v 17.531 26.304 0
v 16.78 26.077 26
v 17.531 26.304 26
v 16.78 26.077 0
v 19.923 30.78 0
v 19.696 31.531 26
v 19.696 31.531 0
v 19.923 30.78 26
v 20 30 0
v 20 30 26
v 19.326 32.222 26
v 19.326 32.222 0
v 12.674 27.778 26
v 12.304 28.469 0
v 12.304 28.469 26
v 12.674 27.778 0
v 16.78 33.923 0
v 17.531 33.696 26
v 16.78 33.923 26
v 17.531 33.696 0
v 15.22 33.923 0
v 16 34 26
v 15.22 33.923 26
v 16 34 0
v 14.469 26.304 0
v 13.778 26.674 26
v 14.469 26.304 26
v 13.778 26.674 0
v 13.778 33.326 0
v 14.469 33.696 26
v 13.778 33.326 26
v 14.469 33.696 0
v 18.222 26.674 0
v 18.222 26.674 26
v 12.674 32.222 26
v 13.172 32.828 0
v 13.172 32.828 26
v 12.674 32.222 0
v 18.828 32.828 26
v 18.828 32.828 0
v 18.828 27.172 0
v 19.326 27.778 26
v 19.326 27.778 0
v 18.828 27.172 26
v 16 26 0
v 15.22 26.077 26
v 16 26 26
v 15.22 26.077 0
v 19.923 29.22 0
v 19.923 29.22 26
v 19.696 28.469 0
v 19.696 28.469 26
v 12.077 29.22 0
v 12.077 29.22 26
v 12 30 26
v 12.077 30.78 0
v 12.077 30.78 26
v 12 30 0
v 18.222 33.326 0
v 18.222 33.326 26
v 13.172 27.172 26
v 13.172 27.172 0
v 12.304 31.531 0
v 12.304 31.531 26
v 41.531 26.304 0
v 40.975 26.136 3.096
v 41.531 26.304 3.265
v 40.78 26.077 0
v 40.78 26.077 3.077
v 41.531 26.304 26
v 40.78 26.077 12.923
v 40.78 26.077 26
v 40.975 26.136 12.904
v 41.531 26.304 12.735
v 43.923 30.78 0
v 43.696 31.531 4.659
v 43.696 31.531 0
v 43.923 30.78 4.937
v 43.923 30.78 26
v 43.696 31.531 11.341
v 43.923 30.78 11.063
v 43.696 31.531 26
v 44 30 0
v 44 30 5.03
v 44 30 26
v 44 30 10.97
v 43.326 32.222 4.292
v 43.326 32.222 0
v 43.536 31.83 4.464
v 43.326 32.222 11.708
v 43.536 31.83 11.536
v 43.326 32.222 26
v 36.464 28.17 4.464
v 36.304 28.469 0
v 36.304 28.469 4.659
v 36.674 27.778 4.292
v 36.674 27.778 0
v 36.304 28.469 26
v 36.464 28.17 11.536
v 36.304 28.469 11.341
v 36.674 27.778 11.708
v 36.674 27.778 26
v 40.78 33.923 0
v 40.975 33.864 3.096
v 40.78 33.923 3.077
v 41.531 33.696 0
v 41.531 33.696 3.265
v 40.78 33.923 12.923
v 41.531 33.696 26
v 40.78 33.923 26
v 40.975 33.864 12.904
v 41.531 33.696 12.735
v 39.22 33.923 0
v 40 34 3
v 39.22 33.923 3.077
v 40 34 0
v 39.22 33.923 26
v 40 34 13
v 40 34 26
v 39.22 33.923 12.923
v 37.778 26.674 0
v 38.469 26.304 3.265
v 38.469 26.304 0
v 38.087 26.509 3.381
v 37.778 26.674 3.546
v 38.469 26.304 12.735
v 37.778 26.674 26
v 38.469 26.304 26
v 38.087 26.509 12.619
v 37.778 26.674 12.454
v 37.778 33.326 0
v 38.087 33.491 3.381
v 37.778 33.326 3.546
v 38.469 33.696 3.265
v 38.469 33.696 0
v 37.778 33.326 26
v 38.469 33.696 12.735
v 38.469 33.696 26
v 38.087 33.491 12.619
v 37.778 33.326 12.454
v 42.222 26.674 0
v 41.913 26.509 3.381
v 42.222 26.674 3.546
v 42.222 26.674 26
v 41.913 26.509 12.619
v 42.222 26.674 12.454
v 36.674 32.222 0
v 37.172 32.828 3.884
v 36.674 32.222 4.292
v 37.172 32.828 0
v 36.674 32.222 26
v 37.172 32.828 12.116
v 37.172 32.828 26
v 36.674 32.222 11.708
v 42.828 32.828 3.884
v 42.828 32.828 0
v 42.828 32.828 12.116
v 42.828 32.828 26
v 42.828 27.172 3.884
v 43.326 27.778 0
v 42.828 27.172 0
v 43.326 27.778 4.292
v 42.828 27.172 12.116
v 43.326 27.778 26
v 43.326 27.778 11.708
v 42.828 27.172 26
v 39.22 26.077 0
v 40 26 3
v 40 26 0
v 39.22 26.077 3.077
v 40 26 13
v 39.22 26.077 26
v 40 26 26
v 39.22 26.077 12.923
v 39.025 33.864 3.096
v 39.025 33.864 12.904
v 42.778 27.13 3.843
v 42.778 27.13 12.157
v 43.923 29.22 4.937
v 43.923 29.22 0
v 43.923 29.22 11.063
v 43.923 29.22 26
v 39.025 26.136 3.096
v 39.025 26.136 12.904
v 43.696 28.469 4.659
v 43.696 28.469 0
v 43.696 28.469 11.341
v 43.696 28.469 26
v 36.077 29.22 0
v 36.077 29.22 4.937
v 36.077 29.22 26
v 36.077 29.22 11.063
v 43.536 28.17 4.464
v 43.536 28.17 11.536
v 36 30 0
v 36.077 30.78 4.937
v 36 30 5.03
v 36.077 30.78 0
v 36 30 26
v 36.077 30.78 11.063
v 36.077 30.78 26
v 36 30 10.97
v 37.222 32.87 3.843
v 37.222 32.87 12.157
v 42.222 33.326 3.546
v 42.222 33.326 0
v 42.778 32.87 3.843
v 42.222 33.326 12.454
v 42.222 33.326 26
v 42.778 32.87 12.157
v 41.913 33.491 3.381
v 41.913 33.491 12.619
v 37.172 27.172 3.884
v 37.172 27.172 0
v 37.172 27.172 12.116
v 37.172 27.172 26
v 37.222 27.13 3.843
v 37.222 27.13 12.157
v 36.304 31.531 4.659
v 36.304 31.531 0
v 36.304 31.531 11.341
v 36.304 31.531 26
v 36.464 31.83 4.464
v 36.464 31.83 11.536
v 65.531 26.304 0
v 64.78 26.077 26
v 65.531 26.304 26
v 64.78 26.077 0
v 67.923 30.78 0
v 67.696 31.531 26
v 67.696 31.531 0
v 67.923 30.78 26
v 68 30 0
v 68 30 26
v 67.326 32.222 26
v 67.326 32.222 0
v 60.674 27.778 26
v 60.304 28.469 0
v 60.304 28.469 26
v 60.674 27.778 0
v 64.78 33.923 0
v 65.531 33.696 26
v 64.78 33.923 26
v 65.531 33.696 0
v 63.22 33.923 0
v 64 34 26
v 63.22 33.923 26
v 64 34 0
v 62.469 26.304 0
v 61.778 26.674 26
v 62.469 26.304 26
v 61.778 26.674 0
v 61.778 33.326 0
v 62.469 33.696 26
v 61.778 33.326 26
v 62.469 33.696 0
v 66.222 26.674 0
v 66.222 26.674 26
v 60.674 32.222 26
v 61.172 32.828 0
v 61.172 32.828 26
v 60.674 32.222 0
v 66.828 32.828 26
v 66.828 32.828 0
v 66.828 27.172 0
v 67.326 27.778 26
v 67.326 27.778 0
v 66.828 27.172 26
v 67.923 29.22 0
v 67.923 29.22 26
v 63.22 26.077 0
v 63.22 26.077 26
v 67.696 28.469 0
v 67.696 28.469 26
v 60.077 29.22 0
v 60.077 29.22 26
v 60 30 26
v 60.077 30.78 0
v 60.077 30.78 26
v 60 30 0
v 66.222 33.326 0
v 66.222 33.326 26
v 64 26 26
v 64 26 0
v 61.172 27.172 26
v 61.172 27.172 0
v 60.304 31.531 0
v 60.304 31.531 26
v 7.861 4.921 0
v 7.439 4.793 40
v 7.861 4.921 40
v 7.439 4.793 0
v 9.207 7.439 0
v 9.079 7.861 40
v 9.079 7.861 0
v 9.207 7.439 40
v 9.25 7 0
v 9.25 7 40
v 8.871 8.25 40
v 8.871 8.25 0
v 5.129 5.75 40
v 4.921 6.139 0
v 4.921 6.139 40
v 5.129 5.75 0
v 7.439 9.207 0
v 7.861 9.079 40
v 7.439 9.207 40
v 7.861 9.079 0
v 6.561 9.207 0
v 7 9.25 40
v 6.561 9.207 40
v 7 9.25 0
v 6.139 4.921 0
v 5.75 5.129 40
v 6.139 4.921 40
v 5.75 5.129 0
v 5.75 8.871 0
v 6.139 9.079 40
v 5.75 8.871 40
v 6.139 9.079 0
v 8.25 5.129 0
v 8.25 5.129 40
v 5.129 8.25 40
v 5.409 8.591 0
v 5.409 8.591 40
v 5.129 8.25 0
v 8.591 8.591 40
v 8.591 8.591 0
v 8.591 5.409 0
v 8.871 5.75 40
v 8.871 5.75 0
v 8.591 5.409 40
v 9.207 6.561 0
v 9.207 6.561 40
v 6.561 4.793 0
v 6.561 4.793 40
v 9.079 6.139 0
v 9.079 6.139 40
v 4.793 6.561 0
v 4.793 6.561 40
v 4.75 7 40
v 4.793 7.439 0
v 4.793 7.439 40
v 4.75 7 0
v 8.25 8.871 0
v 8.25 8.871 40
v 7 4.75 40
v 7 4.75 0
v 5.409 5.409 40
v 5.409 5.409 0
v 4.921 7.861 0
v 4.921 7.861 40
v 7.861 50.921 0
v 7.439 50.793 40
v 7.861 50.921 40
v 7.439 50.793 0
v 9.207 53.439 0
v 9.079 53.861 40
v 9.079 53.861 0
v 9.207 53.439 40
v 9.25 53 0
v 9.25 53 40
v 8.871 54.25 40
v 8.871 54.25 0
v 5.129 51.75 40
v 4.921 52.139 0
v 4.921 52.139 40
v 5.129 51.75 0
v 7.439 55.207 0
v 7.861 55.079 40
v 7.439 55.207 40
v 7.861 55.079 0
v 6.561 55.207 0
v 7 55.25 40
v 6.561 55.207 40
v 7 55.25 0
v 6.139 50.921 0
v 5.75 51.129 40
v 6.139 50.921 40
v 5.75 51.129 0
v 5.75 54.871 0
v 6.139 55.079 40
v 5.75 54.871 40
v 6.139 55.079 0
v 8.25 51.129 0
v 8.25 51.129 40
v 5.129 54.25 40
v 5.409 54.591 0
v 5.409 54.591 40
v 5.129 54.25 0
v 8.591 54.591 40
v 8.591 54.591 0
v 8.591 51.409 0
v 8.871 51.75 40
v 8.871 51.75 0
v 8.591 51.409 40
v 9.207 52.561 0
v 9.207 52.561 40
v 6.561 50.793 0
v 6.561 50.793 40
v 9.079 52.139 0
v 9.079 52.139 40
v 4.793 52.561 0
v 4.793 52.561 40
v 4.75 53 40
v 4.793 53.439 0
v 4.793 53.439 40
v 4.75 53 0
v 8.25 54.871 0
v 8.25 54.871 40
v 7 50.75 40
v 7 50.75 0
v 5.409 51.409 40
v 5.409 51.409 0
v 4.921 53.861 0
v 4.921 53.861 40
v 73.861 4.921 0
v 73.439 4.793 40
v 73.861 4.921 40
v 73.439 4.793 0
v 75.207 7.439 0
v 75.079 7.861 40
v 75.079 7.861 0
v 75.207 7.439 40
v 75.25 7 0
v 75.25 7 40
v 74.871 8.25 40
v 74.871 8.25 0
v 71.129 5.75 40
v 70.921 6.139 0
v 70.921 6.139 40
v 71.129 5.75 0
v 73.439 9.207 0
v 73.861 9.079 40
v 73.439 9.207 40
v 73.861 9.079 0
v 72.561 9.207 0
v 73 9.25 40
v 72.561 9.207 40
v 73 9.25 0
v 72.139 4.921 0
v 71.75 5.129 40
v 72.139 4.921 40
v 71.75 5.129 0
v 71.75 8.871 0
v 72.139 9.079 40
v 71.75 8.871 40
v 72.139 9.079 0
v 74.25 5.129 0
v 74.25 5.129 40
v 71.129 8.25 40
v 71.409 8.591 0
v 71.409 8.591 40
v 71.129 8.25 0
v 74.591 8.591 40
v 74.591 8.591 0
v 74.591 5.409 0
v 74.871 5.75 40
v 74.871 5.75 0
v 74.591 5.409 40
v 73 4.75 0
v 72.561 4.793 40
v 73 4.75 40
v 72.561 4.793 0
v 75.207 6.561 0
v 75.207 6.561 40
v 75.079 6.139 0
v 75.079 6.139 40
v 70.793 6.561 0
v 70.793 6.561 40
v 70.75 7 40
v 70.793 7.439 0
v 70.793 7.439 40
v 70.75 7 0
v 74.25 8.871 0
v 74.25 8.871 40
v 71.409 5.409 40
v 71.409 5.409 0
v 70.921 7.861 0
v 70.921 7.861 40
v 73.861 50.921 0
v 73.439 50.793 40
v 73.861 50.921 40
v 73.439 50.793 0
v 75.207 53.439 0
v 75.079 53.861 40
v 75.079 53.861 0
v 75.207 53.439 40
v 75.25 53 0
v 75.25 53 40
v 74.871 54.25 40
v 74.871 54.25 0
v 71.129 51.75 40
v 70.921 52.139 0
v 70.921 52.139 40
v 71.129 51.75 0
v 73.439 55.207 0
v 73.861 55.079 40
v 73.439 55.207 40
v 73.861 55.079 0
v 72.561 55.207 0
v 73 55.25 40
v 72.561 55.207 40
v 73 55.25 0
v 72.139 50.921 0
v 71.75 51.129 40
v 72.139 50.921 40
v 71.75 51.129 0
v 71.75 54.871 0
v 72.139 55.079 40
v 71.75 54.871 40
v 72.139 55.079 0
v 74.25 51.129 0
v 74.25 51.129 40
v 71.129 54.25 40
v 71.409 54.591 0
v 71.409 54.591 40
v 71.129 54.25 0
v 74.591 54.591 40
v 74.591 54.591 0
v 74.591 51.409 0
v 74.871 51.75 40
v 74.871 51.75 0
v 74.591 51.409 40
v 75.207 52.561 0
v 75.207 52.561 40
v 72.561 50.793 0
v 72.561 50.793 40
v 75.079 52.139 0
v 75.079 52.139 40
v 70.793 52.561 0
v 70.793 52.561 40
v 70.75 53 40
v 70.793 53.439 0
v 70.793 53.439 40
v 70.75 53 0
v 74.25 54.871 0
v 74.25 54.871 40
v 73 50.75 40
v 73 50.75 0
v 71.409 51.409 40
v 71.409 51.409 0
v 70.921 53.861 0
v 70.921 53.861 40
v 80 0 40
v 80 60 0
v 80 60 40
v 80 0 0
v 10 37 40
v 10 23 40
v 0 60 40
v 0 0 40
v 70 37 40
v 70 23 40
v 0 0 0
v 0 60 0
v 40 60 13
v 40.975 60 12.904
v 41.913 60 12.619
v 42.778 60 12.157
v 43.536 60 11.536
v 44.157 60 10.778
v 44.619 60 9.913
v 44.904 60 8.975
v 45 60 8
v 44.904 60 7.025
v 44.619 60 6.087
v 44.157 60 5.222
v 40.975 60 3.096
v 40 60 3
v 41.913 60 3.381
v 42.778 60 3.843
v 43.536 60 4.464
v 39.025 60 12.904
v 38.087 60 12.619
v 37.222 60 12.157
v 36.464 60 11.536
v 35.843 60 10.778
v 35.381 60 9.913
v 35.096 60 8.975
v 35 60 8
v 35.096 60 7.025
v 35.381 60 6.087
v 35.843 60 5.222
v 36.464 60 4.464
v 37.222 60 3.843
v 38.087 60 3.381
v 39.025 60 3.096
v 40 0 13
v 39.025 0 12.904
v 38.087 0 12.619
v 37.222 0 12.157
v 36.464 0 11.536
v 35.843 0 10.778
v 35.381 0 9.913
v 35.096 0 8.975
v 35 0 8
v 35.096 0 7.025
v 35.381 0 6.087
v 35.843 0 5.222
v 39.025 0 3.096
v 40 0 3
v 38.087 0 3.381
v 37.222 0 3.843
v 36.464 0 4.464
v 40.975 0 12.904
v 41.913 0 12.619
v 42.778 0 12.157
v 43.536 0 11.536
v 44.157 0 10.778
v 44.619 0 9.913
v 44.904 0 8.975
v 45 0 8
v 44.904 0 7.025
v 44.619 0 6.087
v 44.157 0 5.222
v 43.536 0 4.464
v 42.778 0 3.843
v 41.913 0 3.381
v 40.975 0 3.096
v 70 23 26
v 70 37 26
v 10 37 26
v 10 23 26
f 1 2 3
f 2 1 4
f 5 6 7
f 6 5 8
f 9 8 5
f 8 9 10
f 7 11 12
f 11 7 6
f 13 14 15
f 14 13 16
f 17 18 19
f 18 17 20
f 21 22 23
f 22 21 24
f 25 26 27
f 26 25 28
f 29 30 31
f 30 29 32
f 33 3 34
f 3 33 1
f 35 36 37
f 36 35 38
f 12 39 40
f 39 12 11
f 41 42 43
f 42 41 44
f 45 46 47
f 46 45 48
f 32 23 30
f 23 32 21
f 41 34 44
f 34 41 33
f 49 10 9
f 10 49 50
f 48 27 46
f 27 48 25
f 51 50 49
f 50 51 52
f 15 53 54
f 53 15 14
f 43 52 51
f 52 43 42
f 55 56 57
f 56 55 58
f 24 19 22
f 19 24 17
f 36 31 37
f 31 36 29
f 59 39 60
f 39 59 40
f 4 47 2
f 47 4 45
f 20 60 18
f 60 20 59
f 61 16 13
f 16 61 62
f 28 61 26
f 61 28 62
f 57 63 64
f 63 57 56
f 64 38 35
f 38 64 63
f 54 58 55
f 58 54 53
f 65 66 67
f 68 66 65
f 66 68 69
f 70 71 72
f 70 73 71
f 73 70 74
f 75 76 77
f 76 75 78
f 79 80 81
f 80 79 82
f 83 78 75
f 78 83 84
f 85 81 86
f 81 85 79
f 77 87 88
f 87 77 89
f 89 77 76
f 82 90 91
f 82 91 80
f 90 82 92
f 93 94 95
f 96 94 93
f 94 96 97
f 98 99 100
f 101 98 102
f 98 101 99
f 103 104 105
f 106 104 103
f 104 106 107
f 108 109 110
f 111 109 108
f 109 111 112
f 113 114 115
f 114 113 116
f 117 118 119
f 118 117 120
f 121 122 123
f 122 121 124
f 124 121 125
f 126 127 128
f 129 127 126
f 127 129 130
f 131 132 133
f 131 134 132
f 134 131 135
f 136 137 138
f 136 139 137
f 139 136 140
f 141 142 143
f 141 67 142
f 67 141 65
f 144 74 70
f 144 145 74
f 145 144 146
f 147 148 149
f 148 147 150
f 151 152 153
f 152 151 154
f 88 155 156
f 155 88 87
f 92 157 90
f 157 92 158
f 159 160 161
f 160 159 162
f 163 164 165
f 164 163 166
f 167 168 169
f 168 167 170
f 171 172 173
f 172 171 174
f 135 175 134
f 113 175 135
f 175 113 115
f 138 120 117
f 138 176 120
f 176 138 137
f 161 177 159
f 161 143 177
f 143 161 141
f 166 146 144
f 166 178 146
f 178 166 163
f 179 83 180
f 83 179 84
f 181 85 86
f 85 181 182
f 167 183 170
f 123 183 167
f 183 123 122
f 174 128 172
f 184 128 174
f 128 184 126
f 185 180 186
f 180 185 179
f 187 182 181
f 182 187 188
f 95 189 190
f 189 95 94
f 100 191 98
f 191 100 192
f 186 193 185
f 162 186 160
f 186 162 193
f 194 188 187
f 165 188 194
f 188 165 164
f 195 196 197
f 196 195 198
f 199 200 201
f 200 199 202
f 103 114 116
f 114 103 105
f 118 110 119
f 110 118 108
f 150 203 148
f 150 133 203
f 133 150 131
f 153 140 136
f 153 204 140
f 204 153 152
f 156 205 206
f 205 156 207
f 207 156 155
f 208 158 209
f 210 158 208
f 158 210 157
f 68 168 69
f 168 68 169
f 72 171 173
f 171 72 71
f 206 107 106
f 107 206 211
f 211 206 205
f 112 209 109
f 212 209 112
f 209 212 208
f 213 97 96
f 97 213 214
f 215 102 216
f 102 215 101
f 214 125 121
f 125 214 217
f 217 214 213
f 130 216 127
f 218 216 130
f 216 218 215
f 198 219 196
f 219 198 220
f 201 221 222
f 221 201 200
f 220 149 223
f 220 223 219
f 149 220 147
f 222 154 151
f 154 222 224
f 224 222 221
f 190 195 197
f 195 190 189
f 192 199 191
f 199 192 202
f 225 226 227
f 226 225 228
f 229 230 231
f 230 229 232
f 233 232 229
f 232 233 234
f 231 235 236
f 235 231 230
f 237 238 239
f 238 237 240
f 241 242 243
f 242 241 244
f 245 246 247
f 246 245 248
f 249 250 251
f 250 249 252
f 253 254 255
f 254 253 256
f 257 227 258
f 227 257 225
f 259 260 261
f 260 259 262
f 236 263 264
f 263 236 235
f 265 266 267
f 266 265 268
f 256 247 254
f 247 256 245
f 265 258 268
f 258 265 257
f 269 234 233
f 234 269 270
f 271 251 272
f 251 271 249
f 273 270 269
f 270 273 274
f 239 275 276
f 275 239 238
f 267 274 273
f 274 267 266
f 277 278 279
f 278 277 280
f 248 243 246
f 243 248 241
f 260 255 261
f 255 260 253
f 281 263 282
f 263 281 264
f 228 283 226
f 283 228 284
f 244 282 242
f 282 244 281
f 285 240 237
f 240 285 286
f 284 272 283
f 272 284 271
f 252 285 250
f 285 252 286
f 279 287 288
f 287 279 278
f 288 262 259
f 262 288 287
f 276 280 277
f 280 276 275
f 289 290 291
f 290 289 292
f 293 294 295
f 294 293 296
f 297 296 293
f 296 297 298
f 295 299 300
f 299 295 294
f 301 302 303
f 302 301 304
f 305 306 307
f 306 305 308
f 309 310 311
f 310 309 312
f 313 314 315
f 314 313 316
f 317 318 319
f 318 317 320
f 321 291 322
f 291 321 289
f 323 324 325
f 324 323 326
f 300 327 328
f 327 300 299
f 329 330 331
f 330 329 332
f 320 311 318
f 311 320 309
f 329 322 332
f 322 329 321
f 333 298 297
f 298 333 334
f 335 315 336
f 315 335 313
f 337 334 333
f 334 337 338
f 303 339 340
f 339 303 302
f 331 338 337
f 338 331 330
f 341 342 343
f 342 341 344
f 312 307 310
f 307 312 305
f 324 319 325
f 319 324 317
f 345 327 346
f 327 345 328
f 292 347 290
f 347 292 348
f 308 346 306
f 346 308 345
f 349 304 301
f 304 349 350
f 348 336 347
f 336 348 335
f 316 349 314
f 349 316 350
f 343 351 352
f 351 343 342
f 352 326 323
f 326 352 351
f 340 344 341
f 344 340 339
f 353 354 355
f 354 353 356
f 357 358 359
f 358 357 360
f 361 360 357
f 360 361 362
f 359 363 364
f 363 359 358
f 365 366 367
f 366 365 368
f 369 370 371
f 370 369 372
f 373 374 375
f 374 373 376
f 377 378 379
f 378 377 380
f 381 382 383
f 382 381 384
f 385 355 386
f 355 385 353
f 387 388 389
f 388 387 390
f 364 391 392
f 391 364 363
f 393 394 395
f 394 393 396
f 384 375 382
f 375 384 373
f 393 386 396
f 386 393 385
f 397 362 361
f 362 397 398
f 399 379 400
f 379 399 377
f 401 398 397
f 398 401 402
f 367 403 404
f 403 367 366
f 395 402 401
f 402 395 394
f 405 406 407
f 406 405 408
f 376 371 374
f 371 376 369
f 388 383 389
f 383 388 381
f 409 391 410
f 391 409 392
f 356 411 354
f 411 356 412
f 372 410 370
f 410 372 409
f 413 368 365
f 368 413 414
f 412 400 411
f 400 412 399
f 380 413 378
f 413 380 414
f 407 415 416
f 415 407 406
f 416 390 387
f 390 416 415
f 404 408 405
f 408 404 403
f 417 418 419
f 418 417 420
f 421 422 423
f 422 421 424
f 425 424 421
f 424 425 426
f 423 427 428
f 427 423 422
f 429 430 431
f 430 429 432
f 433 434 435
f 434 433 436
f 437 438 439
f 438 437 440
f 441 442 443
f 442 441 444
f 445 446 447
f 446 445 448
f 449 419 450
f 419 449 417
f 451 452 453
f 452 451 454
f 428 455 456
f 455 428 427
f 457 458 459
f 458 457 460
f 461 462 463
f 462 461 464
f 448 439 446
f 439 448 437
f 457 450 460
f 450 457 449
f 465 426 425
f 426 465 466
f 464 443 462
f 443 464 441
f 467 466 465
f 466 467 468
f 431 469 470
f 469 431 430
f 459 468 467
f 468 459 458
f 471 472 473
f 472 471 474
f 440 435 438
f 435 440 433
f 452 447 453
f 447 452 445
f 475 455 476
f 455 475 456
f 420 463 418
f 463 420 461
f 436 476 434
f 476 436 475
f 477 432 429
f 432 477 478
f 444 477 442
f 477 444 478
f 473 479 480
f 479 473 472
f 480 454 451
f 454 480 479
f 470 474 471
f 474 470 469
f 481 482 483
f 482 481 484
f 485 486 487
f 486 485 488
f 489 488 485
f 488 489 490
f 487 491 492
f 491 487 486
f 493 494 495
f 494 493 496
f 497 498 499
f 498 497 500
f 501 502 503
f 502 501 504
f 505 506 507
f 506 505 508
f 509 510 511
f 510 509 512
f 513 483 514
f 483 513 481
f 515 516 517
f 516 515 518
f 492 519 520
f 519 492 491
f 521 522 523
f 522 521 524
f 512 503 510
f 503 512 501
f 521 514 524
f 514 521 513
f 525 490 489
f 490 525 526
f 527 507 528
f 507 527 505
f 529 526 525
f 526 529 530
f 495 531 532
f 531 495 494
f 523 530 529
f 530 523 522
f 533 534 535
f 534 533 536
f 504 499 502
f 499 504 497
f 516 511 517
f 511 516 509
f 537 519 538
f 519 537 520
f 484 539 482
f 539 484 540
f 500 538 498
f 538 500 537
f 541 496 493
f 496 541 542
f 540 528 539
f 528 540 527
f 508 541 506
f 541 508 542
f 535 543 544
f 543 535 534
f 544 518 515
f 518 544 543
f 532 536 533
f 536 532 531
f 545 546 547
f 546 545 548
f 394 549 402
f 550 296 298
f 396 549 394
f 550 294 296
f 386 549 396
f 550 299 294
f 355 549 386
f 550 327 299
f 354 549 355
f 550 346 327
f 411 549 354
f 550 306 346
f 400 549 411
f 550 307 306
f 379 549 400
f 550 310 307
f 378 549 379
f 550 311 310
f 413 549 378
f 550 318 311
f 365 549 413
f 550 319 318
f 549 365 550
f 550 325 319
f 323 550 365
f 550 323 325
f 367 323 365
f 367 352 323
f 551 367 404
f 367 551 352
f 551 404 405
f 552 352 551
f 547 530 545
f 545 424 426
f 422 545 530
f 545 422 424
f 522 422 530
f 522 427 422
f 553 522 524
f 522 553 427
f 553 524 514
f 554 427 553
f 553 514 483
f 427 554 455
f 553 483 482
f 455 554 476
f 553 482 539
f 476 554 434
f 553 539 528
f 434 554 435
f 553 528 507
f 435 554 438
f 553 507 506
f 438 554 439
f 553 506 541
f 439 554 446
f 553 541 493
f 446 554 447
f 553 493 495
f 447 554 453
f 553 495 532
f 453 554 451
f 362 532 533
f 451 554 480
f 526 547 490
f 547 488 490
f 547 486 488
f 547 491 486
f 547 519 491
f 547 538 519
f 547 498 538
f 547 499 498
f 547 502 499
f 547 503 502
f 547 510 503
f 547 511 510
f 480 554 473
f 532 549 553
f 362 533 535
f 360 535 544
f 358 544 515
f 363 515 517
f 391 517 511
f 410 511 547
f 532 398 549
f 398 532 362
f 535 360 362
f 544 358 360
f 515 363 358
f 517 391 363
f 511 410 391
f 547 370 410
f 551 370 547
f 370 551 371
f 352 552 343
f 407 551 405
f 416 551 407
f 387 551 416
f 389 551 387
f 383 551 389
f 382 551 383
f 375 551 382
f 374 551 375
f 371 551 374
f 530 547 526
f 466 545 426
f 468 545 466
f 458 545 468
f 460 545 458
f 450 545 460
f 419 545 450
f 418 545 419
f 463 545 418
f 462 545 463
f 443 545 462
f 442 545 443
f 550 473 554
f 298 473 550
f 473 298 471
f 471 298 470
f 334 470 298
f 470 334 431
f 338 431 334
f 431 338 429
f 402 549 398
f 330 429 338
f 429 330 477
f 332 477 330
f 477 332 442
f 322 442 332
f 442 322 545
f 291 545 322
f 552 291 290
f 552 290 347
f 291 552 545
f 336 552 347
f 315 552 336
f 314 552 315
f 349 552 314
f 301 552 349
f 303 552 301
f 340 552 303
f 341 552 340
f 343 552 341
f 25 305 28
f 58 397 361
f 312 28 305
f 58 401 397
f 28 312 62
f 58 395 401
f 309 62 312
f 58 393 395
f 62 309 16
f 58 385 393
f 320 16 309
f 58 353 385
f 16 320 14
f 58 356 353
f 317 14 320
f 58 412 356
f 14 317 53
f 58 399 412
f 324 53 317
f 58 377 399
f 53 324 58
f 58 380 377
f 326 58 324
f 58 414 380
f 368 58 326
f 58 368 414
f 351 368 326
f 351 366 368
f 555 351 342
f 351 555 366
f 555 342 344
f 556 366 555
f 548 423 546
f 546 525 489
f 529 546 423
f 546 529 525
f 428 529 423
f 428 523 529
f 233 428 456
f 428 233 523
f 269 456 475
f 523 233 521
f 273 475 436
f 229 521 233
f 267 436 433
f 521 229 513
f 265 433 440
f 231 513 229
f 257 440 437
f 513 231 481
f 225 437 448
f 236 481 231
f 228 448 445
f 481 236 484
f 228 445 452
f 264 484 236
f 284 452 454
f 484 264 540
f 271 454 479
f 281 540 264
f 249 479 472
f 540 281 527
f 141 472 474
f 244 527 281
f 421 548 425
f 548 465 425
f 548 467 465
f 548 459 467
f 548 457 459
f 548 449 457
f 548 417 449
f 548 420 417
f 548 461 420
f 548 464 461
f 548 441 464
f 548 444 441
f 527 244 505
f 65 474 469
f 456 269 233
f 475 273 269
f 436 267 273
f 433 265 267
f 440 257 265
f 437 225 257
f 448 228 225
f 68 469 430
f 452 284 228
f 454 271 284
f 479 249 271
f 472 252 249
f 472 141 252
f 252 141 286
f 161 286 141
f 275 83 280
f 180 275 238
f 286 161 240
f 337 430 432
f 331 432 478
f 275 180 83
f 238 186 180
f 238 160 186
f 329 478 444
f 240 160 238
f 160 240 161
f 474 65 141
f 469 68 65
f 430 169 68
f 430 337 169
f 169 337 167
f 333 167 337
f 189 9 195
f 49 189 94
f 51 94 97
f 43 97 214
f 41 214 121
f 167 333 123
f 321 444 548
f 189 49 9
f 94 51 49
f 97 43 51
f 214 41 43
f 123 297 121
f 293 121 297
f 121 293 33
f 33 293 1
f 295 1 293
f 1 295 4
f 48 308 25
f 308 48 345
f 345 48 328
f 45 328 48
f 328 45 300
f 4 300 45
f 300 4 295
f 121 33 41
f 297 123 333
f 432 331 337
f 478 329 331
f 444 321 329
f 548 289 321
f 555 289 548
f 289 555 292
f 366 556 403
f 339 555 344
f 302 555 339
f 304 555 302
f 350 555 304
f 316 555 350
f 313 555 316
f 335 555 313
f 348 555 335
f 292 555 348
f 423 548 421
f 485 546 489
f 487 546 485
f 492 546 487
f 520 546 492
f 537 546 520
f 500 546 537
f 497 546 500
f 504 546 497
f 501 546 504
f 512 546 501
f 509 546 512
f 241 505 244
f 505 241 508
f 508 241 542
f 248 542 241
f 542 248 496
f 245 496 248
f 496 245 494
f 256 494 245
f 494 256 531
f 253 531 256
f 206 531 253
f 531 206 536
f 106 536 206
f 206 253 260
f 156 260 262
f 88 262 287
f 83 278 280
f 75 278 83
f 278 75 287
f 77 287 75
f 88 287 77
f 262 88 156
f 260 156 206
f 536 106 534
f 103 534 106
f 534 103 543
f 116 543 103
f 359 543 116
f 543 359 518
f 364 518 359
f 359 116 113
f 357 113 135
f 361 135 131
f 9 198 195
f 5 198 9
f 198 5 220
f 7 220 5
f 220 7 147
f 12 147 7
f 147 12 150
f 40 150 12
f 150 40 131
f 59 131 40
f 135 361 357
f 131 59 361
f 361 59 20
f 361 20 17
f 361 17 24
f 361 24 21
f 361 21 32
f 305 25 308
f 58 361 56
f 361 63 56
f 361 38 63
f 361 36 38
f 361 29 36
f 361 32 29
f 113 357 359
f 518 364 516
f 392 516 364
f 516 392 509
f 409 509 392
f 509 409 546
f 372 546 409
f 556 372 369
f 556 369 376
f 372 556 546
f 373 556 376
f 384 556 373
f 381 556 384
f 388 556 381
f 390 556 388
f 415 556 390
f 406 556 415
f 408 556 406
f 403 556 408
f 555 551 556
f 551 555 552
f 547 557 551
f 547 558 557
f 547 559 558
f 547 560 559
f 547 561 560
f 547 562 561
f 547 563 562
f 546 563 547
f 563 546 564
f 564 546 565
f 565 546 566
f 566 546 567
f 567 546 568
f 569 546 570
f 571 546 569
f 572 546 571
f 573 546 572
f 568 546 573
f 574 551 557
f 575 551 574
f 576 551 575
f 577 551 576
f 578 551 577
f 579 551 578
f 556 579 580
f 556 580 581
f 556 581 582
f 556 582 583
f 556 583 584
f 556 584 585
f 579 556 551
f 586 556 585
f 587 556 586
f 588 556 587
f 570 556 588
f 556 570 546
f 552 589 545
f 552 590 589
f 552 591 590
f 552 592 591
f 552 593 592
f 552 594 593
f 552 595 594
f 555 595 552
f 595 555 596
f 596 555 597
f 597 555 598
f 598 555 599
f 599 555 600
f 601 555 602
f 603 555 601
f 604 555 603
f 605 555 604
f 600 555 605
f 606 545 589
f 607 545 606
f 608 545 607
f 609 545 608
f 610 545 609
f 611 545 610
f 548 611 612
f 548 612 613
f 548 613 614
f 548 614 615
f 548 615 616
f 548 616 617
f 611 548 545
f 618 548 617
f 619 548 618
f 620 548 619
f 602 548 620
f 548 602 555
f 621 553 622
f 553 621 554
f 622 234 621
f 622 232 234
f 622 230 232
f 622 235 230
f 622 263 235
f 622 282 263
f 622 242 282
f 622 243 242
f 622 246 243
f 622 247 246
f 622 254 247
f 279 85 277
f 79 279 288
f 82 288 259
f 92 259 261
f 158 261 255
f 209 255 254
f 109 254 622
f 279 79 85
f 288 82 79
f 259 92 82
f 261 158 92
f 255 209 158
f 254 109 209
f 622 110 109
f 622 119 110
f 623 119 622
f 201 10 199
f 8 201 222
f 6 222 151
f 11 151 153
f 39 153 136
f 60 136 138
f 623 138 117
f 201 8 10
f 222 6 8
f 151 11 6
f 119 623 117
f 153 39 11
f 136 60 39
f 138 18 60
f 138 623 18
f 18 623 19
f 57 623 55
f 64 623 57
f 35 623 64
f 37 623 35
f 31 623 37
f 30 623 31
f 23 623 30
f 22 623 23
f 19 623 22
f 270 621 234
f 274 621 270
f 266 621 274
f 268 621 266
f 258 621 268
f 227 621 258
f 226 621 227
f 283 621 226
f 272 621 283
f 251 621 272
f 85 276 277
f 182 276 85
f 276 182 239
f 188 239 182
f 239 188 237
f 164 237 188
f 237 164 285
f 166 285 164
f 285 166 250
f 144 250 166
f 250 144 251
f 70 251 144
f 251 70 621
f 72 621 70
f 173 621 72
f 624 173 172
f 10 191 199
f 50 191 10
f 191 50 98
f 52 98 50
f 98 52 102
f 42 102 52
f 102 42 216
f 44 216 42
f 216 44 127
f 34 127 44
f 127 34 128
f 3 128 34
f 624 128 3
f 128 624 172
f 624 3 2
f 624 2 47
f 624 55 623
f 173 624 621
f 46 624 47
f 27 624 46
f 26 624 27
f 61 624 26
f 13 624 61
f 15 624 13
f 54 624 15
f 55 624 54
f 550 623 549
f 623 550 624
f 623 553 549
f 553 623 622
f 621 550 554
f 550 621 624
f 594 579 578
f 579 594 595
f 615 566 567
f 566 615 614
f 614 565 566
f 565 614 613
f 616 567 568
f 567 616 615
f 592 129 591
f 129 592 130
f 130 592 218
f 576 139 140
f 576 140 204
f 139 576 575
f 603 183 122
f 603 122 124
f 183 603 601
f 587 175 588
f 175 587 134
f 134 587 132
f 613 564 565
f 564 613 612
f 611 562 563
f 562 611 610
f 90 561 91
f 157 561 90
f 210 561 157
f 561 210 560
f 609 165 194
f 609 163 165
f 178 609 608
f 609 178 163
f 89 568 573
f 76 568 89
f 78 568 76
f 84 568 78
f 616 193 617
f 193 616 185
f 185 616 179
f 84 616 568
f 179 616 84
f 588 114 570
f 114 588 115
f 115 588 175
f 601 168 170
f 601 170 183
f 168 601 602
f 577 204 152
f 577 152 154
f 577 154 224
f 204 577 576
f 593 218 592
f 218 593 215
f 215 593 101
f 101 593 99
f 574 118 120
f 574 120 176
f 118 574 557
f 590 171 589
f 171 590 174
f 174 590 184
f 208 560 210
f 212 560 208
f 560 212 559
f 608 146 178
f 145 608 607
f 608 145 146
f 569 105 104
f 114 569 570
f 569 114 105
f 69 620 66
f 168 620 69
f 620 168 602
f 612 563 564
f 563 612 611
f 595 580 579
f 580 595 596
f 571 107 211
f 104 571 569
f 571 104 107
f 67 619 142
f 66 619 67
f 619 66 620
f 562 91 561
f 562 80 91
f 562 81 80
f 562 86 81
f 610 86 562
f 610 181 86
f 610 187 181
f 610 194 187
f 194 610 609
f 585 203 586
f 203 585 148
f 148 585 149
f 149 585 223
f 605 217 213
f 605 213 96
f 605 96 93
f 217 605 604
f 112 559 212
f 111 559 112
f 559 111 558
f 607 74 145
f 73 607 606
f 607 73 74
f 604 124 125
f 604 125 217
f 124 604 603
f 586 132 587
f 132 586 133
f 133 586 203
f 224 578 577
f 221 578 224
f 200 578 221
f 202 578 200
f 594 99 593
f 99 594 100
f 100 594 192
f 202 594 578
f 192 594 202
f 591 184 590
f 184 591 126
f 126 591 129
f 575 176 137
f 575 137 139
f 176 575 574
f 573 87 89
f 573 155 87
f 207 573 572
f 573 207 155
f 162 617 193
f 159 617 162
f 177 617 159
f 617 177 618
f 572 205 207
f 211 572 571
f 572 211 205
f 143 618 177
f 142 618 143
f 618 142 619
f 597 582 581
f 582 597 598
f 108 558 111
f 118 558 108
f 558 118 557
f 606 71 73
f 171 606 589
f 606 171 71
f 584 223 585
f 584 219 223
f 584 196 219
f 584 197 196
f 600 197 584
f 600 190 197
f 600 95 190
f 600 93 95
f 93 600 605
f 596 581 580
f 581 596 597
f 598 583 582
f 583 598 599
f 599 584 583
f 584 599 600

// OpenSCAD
$fn = 32;

// ----------------------------------------------------------------------
// Manifold block: side_outlet manifold
// ----------------------------------------------------------------------

// --- parameters (mm) ---
block_l = 80;             // block length, X
block_w = 60;             // block width, Y
block_h = 40;             // block height, Z
port_d = 8;               // port bore diameter
port_pitch = 24;          // port pitch along X
gallery_d = 14;           // top gallery width, Y
gallery_depth = 14;       // gallery pocket depth
wall_p = 10;              // gallery end wall thickness, X
mnt_d = 4.5;              // mounting hole diameter
mnt_in = 7;               // mounting hole inset from the edges
out_d = 10;               // outlet bore diameter
out_z = 8;                // outlet axis height

n_ports = 3;  // ports in the row
port_x0 = (block_l - (n_ports - 1) * port_pitch) / 2;  // first port X

difference() {
  cube([block_l, block_w, block_h]);
  for (i = [0 : n_ports - 1])
    translate([port_x0 + i * port_pitch, block_w / 2, -1])
      cylinder(h = block_h + 2, d = port_d);
  translate([wall_p, block_w / 2 - gallery_d / 2, block_h - gallery_depth])
    cube([block_l - 2 * wall_p, gallery_d, gallery_depth + 1]);
  for (cx = [mnt_in, block_l - mnt_in])
    for (cy = [mnt_in, block_w - mnt_in])
      translate([cx, cy, -1]) cylinder(h = block_h + 2, d = mnt_d);
  translate([block_l / 2, -1, out_z]) rotate([-90, 0, 0])
    cylinder(h = block_w + 2, d = out_d);
}
